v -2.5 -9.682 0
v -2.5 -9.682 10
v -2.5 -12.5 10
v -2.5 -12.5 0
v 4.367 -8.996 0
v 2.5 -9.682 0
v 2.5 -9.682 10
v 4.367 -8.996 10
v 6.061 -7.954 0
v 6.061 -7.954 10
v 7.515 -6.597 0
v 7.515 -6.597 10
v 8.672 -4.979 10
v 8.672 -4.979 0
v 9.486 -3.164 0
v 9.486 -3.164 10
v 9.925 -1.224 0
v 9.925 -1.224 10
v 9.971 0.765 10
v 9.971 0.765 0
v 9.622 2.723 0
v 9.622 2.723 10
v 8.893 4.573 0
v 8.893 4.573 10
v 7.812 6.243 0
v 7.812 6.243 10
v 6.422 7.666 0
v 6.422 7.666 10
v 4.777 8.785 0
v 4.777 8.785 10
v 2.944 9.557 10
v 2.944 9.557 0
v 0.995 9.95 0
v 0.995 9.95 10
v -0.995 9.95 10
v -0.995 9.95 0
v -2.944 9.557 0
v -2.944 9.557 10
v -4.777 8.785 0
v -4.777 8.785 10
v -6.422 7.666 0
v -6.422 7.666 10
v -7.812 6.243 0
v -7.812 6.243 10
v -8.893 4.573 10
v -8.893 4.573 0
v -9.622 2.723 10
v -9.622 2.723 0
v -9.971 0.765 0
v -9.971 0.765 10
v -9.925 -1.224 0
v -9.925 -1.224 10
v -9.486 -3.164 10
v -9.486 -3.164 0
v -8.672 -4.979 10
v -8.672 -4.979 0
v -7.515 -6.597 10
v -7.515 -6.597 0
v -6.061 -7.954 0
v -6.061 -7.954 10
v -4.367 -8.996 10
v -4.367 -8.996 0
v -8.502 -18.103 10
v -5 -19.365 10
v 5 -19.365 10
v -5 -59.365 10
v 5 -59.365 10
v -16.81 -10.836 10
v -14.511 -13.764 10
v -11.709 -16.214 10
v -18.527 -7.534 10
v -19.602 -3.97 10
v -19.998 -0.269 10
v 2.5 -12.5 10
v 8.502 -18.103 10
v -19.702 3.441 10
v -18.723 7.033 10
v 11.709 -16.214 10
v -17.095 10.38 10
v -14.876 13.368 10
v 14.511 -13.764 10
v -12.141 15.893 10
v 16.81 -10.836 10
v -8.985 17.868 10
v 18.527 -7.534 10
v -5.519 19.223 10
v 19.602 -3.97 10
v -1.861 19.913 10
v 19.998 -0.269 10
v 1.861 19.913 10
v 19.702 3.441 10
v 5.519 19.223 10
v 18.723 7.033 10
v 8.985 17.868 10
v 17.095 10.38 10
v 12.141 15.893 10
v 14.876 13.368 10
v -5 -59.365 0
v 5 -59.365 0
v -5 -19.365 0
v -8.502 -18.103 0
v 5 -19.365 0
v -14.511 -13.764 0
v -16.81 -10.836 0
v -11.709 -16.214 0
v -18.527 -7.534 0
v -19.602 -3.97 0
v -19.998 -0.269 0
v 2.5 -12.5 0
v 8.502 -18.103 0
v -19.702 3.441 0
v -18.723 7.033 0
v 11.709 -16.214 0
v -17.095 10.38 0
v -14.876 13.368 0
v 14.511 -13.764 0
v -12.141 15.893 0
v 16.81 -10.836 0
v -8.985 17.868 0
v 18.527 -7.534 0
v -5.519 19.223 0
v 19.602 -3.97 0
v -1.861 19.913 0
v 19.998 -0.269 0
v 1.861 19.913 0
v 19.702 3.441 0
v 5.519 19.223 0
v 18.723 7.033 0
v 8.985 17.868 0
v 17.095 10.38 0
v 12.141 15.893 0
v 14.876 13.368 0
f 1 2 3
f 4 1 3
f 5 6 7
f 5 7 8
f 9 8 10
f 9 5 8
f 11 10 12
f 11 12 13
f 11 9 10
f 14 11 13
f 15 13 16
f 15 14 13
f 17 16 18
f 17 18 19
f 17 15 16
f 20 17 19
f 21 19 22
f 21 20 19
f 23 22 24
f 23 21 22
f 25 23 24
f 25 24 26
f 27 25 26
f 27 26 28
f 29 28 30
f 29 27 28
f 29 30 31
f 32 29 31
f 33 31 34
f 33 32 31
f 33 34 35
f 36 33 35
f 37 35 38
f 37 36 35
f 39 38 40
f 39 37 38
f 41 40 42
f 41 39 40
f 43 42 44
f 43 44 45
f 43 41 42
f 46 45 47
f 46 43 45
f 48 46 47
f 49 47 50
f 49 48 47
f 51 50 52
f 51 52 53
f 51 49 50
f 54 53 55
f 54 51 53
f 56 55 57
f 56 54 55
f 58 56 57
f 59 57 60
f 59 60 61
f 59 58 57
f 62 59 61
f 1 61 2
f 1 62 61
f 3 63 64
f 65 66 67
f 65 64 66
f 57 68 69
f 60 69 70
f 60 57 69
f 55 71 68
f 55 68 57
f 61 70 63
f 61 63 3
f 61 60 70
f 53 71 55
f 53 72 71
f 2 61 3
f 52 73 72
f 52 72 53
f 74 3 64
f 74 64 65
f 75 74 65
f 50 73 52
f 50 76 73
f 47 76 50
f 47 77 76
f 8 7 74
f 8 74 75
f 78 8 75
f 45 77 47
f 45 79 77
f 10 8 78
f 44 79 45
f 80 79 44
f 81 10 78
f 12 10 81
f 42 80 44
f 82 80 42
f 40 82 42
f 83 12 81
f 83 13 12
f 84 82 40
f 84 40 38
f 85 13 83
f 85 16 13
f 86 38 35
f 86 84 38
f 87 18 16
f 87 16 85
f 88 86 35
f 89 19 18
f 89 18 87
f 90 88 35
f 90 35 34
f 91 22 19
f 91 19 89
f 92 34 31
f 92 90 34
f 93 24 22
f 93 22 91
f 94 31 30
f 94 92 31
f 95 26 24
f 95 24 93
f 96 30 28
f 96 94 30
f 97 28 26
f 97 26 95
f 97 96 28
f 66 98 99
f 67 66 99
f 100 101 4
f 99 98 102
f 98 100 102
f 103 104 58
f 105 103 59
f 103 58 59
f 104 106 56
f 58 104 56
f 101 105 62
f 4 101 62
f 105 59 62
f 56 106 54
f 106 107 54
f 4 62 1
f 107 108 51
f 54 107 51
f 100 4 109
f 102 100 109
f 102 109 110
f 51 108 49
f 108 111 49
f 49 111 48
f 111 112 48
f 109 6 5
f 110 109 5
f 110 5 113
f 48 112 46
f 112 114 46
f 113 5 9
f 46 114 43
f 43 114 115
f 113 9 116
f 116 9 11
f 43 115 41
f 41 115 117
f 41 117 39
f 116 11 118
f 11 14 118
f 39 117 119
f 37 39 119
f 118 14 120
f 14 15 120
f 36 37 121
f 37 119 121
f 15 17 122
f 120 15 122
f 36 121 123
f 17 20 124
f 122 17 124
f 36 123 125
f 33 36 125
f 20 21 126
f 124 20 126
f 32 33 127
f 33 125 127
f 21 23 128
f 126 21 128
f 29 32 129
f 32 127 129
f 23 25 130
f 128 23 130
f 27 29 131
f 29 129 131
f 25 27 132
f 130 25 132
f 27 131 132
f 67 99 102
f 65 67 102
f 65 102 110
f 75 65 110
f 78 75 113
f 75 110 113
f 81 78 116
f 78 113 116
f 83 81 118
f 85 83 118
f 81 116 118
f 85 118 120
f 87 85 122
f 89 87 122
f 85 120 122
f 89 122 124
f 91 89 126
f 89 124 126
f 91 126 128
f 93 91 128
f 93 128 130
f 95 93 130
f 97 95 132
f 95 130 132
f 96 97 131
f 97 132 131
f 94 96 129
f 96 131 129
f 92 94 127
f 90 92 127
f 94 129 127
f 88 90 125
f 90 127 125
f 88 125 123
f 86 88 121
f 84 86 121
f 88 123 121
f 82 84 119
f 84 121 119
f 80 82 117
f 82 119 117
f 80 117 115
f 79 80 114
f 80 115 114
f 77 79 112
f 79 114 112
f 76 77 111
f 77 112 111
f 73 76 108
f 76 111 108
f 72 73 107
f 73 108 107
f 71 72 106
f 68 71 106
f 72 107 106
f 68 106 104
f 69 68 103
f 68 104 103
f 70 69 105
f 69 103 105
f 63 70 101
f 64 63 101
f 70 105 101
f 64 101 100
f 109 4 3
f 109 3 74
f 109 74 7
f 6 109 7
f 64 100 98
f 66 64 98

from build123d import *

# Parameters (mm, degrees)
BOSS_EXTRUDE1_DEPTH = 10


with BuildPart() as part:
    # Sketch1 → Boss-Extrude1 (new body)
    with BuildSketch(Plane.XY):
        with BuildLine():
            Line((-5, -59.364916731), (5, -59.364916731))
            Line((5, -59.364916731), (5, -19.364916731))
            ThreePointArc((5, -19.364916731), (0, 20), (-5, -19.364916731))
            Line((-5, -19.364916731), (-5, -59.364916731))
        make_face()
        with BuildLine():
            Line((-2.5, -12.5), (2.5, -12.5))
            Line((2.5, -12.5), (2.5, -9.682458366))
            ThreePointArc((2.5, -9.682458366), (0, 10), (-2.5, -9.682458366))
            Line((-2.5, -9.682458366), (-2.5, -12.5))
        make_face(mode=Mode.SUBTRACT)
    extrude(amount=BOSS_EXTRUDE1_DEPTH)


solid = part.part
